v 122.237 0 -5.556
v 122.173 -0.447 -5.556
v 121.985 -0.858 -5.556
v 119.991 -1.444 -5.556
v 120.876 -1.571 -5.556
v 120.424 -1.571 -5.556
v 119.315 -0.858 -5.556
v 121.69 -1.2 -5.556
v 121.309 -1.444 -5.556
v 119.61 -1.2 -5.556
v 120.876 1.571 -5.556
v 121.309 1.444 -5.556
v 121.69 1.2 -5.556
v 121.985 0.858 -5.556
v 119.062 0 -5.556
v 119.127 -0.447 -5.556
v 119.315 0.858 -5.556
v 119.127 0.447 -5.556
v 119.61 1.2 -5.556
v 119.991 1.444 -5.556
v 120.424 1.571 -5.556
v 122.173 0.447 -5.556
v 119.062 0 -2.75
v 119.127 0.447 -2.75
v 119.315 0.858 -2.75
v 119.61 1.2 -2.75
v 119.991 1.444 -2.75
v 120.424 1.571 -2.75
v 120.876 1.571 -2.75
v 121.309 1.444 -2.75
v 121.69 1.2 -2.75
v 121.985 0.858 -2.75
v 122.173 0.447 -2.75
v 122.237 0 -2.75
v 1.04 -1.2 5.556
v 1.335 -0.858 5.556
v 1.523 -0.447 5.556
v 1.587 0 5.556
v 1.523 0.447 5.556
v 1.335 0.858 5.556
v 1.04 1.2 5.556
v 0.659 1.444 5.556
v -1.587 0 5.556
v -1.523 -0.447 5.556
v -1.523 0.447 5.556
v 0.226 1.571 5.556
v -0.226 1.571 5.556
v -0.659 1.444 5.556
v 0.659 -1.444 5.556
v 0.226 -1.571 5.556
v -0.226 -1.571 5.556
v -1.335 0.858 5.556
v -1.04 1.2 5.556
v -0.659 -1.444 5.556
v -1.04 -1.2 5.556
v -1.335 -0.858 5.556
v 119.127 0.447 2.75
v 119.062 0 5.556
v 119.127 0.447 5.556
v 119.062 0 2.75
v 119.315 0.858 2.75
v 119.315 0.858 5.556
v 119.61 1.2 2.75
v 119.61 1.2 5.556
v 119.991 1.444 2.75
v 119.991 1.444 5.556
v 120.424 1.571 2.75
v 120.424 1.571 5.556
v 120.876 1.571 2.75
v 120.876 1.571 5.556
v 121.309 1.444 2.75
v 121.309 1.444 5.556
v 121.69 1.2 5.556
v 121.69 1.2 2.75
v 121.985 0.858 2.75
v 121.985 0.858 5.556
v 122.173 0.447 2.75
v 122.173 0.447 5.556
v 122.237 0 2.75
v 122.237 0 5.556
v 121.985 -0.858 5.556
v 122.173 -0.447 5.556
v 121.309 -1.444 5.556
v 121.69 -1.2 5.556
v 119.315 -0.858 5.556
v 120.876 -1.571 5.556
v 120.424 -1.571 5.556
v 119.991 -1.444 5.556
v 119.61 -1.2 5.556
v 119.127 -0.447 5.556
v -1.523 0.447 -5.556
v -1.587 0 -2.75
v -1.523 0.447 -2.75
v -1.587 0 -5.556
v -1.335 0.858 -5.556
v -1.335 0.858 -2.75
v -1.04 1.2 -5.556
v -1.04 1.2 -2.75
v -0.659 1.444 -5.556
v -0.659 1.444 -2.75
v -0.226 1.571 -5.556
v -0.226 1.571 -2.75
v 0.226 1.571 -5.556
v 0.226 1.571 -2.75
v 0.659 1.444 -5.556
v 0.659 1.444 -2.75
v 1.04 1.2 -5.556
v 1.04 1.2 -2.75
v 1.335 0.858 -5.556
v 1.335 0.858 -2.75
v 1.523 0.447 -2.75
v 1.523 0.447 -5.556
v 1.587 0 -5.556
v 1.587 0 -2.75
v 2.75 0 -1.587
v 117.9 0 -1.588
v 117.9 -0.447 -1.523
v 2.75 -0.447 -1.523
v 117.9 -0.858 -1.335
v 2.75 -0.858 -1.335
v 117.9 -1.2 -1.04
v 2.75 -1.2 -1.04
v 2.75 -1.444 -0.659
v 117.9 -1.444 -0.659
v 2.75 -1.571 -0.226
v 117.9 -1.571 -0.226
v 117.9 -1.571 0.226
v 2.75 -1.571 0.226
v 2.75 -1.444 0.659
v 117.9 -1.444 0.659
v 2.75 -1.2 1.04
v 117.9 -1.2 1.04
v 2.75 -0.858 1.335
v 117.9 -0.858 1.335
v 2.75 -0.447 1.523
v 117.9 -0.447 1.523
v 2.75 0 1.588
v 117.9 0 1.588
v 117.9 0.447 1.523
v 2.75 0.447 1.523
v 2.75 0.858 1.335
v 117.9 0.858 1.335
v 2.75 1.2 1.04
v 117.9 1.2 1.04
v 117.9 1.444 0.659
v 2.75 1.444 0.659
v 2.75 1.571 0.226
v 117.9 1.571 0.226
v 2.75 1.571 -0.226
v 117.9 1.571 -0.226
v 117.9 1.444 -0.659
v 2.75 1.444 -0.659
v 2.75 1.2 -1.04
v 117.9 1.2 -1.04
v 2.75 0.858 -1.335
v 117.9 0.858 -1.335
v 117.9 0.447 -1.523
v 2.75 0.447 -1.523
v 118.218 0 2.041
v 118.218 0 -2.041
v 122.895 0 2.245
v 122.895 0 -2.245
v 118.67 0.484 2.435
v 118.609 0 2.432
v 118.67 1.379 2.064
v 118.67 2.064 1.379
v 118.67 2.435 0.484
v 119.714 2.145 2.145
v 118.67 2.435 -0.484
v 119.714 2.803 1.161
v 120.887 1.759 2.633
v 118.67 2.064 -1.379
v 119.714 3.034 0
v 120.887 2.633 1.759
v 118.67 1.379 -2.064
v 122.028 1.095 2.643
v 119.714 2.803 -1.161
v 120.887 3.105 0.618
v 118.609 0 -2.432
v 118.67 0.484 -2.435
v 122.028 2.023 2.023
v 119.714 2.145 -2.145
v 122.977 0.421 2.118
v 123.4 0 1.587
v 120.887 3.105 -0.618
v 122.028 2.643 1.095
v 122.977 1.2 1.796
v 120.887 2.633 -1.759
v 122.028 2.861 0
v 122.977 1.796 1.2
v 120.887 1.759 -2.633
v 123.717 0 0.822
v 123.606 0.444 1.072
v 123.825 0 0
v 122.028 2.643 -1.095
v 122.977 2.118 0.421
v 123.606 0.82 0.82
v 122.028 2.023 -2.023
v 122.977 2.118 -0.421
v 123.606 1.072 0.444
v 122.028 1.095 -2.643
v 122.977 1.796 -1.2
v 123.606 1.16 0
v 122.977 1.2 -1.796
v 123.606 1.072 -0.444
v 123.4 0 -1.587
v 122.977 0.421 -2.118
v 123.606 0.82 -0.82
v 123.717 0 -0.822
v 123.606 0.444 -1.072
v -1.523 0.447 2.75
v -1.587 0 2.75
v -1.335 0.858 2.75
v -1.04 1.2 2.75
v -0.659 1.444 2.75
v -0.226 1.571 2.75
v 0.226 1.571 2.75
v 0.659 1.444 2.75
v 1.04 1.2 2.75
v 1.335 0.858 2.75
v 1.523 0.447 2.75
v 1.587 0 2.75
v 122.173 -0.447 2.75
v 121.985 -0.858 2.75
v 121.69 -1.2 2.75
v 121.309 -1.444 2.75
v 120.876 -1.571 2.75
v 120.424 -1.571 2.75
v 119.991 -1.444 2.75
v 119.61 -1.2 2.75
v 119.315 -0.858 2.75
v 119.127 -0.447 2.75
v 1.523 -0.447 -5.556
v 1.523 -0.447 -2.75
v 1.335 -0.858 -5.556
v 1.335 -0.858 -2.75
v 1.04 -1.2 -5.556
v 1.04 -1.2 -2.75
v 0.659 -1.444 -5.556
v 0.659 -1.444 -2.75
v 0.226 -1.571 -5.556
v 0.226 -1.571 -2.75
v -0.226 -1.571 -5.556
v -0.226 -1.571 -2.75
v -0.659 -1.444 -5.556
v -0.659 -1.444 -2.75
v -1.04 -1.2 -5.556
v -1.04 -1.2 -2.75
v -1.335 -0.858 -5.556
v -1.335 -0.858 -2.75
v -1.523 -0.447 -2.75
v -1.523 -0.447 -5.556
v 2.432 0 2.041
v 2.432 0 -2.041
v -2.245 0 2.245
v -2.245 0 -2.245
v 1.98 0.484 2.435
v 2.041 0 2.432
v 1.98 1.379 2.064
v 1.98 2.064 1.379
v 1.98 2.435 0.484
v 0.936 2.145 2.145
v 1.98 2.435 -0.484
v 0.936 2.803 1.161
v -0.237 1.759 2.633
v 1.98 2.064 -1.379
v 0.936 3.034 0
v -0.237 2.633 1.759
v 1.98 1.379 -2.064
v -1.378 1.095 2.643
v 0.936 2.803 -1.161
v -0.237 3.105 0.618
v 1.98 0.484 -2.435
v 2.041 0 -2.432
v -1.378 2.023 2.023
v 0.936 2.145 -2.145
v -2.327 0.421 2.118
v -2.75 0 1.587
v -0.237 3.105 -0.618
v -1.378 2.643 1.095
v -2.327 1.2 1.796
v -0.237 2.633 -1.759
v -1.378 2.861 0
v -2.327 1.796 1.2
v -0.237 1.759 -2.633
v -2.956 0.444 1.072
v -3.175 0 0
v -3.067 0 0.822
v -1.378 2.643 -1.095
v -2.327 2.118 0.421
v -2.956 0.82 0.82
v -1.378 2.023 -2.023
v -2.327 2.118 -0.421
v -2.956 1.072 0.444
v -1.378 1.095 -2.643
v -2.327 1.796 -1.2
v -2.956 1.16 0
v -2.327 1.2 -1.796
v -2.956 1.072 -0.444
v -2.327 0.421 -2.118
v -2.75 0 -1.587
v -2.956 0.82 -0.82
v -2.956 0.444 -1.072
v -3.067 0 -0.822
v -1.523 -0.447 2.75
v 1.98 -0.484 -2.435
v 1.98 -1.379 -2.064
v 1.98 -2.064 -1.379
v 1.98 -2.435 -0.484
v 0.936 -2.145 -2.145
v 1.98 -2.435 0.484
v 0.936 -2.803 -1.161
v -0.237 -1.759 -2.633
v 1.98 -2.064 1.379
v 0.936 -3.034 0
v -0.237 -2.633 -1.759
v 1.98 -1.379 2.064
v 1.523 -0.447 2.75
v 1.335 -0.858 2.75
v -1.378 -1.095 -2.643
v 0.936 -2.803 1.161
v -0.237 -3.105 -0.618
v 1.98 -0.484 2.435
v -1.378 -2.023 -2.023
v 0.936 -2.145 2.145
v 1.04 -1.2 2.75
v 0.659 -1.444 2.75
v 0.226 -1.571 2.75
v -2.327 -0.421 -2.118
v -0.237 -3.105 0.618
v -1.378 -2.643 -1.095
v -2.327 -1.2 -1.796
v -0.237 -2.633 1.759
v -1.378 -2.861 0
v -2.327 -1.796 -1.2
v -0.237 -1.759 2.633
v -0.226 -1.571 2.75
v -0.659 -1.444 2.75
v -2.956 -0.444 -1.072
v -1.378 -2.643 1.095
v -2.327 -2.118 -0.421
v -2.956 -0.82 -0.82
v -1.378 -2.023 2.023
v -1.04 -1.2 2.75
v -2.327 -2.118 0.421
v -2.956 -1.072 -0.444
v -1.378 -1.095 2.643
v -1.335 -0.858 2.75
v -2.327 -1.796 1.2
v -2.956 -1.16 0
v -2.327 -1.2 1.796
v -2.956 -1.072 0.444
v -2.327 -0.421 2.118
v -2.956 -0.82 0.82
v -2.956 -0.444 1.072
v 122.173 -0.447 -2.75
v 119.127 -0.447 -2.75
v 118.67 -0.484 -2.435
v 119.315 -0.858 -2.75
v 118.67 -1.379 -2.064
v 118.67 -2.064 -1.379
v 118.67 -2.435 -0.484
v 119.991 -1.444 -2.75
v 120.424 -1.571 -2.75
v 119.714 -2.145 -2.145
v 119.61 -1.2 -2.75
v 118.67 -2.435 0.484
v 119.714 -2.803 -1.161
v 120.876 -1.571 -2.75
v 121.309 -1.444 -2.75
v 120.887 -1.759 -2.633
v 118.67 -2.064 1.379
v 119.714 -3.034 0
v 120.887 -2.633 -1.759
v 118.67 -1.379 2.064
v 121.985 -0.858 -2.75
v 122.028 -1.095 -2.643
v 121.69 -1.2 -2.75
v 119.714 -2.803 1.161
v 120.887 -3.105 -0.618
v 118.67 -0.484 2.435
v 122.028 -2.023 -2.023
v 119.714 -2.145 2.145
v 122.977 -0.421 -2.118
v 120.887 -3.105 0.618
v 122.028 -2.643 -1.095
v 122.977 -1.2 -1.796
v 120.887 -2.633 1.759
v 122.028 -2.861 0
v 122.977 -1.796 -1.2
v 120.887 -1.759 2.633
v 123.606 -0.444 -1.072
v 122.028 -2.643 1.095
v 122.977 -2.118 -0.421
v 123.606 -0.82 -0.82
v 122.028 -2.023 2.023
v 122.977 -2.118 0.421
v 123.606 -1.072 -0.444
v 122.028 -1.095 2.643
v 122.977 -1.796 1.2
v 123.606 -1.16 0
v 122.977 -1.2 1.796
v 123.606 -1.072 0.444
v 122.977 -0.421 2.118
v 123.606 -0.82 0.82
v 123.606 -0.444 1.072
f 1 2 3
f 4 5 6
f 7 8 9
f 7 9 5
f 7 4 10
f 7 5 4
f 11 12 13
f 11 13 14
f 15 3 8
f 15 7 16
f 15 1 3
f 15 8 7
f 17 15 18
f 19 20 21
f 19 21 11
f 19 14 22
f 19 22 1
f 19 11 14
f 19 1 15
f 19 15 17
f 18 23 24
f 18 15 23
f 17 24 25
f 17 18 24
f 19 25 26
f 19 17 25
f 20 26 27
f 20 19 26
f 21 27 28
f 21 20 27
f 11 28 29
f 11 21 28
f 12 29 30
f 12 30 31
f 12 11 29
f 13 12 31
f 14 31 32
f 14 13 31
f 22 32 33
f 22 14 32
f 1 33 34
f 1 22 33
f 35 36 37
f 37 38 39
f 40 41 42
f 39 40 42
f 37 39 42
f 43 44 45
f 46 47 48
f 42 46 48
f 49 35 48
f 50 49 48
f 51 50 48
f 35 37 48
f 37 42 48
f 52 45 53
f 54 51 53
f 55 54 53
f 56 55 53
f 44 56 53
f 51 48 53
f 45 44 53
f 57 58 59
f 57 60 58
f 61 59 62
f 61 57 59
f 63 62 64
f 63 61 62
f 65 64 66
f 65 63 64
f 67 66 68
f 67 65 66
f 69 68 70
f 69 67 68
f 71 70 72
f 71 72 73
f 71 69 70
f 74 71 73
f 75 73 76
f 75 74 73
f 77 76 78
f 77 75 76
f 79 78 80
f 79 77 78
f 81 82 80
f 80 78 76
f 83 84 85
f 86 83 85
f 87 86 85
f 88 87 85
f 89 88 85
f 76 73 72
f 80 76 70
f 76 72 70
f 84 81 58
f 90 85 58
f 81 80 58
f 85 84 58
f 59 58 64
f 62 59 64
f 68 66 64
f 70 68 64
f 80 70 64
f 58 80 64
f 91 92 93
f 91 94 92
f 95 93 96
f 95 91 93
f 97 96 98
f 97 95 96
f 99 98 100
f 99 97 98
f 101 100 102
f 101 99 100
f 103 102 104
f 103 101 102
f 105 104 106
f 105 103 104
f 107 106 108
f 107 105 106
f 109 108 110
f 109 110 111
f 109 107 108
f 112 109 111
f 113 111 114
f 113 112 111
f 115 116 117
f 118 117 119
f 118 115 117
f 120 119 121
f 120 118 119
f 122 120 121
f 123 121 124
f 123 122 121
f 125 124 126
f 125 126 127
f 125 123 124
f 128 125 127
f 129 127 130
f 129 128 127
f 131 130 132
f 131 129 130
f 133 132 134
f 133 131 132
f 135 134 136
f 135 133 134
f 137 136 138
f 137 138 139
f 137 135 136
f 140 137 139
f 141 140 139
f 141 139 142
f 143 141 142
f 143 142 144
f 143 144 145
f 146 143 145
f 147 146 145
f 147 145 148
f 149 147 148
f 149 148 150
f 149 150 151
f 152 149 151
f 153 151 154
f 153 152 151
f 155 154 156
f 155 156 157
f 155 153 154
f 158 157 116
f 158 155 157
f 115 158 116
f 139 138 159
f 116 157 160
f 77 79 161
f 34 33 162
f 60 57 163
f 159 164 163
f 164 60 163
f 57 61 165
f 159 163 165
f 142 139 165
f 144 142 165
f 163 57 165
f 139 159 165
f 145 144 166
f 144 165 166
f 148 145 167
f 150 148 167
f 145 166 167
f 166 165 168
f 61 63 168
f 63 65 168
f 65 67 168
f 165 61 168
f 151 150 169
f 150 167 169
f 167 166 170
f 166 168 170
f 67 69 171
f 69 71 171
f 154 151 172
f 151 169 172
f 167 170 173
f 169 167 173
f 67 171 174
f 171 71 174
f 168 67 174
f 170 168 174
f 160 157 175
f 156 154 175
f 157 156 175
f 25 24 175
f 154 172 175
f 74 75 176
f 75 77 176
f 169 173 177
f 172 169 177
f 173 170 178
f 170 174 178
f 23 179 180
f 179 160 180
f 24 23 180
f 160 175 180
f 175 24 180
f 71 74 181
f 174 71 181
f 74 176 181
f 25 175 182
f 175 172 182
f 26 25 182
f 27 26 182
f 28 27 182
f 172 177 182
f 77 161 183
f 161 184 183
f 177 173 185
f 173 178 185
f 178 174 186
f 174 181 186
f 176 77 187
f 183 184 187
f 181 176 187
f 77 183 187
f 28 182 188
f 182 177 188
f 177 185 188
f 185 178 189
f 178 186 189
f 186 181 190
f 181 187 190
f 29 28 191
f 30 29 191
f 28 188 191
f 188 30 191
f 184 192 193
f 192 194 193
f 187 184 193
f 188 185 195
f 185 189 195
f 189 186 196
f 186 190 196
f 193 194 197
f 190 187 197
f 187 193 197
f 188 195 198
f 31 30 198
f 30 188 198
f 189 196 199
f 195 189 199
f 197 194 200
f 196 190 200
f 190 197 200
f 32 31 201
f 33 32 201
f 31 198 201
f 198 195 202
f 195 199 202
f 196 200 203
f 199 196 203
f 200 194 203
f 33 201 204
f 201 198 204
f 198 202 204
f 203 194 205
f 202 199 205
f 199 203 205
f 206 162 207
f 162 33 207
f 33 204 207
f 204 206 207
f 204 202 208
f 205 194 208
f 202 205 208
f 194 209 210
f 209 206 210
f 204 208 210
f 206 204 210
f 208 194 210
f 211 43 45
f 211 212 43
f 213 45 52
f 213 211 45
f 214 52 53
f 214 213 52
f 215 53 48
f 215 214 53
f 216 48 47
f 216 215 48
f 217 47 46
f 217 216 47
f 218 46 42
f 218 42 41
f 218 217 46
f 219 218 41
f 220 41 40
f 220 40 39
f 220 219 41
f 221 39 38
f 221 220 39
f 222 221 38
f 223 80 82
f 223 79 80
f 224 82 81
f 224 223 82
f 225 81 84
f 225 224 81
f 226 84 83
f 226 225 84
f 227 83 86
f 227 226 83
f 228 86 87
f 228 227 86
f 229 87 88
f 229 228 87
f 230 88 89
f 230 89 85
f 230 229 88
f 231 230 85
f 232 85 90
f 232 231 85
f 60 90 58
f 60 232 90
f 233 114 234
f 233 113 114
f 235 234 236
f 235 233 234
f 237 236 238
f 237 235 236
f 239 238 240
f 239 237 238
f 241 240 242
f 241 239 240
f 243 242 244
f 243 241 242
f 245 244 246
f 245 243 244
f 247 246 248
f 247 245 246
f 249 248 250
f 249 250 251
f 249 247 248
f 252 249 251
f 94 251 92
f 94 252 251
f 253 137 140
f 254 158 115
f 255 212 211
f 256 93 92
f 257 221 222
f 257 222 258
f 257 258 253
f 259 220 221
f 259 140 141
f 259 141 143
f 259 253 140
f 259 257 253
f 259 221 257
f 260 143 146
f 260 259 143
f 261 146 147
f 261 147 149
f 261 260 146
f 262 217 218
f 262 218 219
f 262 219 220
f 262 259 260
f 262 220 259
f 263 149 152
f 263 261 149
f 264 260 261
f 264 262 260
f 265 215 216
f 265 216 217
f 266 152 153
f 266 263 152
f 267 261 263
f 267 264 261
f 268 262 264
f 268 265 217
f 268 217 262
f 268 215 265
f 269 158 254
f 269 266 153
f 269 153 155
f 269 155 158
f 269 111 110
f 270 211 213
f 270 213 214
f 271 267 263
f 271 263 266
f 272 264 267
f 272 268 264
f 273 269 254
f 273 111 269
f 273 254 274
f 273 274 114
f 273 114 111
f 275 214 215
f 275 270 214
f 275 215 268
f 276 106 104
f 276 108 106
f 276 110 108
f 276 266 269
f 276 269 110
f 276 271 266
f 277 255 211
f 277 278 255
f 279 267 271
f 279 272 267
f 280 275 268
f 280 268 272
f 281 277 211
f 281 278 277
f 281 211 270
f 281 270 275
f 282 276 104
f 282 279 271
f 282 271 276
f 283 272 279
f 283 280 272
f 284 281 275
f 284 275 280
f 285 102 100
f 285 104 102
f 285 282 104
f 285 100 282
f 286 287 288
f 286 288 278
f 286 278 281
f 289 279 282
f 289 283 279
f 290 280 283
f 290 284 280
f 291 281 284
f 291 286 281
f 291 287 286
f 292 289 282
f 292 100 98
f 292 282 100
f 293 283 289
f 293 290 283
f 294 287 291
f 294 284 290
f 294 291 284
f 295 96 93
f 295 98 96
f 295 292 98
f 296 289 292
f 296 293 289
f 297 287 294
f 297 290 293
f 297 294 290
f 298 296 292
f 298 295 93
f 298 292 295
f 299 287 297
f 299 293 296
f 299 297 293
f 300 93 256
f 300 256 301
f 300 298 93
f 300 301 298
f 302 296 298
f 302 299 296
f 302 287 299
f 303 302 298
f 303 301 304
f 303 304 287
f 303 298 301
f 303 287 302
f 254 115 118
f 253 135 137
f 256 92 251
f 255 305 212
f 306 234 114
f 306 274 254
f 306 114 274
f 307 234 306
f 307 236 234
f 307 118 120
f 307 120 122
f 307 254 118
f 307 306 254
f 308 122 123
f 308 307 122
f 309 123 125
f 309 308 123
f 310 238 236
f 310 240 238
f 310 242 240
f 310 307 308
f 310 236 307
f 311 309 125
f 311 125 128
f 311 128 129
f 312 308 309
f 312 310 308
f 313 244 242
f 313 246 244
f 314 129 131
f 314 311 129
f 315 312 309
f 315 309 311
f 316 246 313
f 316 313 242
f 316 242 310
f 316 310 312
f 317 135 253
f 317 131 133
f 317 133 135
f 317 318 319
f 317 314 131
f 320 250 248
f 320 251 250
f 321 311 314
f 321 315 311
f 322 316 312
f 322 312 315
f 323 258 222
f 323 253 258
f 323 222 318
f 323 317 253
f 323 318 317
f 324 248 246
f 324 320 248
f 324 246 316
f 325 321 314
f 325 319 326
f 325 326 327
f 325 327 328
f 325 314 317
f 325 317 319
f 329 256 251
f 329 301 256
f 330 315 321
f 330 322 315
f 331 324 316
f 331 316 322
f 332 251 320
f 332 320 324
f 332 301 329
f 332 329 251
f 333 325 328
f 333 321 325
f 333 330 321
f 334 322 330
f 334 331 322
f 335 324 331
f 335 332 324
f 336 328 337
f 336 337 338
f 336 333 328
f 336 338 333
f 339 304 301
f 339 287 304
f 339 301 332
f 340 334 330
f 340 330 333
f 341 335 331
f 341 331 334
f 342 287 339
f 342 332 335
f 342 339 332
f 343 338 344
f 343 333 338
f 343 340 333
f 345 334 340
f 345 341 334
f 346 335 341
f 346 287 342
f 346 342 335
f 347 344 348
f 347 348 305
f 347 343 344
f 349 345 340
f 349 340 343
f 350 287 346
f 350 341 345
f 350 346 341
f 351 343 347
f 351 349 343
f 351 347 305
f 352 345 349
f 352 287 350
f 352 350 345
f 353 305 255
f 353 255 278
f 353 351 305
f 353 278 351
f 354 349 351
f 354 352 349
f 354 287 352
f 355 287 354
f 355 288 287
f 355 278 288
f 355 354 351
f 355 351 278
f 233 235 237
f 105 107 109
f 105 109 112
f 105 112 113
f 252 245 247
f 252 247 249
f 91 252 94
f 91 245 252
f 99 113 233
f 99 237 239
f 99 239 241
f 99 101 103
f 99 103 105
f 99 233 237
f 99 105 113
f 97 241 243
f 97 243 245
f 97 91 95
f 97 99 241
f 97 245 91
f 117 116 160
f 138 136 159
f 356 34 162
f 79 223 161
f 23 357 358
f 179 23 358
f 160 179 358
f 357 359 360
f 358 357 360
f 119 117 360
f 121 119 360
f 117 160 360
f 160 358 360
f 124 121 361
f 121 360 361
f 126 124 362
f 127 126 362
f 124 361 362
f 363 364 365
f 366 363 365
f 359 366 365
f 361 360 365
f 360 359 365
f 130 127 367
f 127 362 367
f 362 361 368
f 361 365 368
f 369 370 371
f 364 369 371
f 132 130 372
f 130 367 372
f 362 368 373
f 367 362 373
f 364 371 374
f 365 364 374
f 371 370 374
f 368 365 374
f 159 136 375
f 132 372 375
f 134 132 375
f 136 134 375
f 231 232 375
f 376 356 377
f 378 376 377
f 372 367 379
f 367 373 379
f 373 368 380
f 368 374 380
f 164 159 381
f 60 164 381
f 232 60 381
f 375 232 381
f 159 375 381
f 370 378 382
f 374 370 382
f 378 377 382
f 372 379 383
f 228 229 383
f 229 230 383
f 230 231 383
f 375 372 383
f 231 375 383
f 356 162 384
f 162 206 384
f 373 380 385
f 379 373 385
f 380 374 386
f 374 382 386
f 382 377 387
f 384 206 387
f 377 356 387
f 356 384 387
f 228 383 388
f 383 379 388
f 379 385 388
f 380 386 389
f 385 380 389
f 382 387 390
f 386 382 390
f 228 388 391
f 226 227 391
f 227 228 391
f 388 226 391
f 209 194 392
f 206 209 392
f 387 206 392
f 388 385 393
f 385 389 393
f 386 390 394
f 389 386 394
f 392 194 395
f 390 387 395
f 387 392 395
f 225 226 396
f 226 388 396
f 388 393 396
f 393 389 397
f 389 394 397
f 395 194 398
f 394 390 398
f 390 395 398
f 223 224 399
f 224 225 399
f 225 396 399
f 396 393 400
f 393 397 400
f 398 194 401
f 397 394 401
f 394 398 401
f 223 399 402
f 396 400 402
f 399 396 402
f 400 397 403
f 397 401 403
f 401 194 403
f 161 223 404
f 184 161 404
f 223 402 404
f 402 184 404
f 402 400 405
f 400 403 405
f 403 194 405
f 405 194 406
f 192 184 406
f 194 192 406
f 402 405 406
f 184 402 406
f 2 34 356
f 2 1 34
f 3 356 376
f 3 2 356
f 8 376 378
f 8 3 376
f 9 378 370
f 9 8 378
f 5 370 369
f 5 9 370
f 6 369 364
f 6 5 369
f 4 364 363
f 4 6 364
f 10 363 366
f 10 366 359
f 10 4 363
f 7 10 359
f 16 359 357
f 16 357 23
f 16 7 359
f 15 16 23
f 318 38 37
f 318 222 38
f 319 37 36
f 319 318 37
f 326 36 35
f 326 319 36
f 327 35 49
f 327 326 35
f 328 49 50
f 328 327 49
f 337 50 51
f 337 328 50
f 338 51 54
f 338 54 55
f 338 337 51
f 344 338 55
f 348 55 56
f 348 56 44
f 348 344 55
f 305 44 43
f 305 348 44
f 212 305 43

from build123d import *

# Parameters (mm, degrees)
SKETCH1_3_R         = 1.5875
BOSS_EXTRUDE1_DEPTH = 5.55625


with BuildPart() as part:
    # Sketch1 → Revolve1 (revolve)
    with BuildSketch(Plane.XY):
        with BuildLine():
            Line((117.900369343, 1.5875), (2.749630657, 1.5875))
            ThreePointArc((2.749630657, 1.5875), (-0.821750468, 3.066814498), (-3.175, 0))
            Line((-3.175, 0), (123.825, 0))
            ThreePointArc((123.825, 0), (121.471750468, 3.066814498), (117.900369343, 1.5875))
        make_face()
    revolve(axis=Axis((123.825, 0, 0), (-1, 0, 0)))

    # Sketch1<3> → Boss-Extrude1 (add, symmetric)
    with BuildSketch(Plane.XY):
        Circle(SKETCH1_3_R)
        with Locations((120.65, 0)):
            Circle(SKETCH1_3_R)
    extrude(amount=BOSS_EXTRUDE1_DEPTH, both=True)


solid = part.part
